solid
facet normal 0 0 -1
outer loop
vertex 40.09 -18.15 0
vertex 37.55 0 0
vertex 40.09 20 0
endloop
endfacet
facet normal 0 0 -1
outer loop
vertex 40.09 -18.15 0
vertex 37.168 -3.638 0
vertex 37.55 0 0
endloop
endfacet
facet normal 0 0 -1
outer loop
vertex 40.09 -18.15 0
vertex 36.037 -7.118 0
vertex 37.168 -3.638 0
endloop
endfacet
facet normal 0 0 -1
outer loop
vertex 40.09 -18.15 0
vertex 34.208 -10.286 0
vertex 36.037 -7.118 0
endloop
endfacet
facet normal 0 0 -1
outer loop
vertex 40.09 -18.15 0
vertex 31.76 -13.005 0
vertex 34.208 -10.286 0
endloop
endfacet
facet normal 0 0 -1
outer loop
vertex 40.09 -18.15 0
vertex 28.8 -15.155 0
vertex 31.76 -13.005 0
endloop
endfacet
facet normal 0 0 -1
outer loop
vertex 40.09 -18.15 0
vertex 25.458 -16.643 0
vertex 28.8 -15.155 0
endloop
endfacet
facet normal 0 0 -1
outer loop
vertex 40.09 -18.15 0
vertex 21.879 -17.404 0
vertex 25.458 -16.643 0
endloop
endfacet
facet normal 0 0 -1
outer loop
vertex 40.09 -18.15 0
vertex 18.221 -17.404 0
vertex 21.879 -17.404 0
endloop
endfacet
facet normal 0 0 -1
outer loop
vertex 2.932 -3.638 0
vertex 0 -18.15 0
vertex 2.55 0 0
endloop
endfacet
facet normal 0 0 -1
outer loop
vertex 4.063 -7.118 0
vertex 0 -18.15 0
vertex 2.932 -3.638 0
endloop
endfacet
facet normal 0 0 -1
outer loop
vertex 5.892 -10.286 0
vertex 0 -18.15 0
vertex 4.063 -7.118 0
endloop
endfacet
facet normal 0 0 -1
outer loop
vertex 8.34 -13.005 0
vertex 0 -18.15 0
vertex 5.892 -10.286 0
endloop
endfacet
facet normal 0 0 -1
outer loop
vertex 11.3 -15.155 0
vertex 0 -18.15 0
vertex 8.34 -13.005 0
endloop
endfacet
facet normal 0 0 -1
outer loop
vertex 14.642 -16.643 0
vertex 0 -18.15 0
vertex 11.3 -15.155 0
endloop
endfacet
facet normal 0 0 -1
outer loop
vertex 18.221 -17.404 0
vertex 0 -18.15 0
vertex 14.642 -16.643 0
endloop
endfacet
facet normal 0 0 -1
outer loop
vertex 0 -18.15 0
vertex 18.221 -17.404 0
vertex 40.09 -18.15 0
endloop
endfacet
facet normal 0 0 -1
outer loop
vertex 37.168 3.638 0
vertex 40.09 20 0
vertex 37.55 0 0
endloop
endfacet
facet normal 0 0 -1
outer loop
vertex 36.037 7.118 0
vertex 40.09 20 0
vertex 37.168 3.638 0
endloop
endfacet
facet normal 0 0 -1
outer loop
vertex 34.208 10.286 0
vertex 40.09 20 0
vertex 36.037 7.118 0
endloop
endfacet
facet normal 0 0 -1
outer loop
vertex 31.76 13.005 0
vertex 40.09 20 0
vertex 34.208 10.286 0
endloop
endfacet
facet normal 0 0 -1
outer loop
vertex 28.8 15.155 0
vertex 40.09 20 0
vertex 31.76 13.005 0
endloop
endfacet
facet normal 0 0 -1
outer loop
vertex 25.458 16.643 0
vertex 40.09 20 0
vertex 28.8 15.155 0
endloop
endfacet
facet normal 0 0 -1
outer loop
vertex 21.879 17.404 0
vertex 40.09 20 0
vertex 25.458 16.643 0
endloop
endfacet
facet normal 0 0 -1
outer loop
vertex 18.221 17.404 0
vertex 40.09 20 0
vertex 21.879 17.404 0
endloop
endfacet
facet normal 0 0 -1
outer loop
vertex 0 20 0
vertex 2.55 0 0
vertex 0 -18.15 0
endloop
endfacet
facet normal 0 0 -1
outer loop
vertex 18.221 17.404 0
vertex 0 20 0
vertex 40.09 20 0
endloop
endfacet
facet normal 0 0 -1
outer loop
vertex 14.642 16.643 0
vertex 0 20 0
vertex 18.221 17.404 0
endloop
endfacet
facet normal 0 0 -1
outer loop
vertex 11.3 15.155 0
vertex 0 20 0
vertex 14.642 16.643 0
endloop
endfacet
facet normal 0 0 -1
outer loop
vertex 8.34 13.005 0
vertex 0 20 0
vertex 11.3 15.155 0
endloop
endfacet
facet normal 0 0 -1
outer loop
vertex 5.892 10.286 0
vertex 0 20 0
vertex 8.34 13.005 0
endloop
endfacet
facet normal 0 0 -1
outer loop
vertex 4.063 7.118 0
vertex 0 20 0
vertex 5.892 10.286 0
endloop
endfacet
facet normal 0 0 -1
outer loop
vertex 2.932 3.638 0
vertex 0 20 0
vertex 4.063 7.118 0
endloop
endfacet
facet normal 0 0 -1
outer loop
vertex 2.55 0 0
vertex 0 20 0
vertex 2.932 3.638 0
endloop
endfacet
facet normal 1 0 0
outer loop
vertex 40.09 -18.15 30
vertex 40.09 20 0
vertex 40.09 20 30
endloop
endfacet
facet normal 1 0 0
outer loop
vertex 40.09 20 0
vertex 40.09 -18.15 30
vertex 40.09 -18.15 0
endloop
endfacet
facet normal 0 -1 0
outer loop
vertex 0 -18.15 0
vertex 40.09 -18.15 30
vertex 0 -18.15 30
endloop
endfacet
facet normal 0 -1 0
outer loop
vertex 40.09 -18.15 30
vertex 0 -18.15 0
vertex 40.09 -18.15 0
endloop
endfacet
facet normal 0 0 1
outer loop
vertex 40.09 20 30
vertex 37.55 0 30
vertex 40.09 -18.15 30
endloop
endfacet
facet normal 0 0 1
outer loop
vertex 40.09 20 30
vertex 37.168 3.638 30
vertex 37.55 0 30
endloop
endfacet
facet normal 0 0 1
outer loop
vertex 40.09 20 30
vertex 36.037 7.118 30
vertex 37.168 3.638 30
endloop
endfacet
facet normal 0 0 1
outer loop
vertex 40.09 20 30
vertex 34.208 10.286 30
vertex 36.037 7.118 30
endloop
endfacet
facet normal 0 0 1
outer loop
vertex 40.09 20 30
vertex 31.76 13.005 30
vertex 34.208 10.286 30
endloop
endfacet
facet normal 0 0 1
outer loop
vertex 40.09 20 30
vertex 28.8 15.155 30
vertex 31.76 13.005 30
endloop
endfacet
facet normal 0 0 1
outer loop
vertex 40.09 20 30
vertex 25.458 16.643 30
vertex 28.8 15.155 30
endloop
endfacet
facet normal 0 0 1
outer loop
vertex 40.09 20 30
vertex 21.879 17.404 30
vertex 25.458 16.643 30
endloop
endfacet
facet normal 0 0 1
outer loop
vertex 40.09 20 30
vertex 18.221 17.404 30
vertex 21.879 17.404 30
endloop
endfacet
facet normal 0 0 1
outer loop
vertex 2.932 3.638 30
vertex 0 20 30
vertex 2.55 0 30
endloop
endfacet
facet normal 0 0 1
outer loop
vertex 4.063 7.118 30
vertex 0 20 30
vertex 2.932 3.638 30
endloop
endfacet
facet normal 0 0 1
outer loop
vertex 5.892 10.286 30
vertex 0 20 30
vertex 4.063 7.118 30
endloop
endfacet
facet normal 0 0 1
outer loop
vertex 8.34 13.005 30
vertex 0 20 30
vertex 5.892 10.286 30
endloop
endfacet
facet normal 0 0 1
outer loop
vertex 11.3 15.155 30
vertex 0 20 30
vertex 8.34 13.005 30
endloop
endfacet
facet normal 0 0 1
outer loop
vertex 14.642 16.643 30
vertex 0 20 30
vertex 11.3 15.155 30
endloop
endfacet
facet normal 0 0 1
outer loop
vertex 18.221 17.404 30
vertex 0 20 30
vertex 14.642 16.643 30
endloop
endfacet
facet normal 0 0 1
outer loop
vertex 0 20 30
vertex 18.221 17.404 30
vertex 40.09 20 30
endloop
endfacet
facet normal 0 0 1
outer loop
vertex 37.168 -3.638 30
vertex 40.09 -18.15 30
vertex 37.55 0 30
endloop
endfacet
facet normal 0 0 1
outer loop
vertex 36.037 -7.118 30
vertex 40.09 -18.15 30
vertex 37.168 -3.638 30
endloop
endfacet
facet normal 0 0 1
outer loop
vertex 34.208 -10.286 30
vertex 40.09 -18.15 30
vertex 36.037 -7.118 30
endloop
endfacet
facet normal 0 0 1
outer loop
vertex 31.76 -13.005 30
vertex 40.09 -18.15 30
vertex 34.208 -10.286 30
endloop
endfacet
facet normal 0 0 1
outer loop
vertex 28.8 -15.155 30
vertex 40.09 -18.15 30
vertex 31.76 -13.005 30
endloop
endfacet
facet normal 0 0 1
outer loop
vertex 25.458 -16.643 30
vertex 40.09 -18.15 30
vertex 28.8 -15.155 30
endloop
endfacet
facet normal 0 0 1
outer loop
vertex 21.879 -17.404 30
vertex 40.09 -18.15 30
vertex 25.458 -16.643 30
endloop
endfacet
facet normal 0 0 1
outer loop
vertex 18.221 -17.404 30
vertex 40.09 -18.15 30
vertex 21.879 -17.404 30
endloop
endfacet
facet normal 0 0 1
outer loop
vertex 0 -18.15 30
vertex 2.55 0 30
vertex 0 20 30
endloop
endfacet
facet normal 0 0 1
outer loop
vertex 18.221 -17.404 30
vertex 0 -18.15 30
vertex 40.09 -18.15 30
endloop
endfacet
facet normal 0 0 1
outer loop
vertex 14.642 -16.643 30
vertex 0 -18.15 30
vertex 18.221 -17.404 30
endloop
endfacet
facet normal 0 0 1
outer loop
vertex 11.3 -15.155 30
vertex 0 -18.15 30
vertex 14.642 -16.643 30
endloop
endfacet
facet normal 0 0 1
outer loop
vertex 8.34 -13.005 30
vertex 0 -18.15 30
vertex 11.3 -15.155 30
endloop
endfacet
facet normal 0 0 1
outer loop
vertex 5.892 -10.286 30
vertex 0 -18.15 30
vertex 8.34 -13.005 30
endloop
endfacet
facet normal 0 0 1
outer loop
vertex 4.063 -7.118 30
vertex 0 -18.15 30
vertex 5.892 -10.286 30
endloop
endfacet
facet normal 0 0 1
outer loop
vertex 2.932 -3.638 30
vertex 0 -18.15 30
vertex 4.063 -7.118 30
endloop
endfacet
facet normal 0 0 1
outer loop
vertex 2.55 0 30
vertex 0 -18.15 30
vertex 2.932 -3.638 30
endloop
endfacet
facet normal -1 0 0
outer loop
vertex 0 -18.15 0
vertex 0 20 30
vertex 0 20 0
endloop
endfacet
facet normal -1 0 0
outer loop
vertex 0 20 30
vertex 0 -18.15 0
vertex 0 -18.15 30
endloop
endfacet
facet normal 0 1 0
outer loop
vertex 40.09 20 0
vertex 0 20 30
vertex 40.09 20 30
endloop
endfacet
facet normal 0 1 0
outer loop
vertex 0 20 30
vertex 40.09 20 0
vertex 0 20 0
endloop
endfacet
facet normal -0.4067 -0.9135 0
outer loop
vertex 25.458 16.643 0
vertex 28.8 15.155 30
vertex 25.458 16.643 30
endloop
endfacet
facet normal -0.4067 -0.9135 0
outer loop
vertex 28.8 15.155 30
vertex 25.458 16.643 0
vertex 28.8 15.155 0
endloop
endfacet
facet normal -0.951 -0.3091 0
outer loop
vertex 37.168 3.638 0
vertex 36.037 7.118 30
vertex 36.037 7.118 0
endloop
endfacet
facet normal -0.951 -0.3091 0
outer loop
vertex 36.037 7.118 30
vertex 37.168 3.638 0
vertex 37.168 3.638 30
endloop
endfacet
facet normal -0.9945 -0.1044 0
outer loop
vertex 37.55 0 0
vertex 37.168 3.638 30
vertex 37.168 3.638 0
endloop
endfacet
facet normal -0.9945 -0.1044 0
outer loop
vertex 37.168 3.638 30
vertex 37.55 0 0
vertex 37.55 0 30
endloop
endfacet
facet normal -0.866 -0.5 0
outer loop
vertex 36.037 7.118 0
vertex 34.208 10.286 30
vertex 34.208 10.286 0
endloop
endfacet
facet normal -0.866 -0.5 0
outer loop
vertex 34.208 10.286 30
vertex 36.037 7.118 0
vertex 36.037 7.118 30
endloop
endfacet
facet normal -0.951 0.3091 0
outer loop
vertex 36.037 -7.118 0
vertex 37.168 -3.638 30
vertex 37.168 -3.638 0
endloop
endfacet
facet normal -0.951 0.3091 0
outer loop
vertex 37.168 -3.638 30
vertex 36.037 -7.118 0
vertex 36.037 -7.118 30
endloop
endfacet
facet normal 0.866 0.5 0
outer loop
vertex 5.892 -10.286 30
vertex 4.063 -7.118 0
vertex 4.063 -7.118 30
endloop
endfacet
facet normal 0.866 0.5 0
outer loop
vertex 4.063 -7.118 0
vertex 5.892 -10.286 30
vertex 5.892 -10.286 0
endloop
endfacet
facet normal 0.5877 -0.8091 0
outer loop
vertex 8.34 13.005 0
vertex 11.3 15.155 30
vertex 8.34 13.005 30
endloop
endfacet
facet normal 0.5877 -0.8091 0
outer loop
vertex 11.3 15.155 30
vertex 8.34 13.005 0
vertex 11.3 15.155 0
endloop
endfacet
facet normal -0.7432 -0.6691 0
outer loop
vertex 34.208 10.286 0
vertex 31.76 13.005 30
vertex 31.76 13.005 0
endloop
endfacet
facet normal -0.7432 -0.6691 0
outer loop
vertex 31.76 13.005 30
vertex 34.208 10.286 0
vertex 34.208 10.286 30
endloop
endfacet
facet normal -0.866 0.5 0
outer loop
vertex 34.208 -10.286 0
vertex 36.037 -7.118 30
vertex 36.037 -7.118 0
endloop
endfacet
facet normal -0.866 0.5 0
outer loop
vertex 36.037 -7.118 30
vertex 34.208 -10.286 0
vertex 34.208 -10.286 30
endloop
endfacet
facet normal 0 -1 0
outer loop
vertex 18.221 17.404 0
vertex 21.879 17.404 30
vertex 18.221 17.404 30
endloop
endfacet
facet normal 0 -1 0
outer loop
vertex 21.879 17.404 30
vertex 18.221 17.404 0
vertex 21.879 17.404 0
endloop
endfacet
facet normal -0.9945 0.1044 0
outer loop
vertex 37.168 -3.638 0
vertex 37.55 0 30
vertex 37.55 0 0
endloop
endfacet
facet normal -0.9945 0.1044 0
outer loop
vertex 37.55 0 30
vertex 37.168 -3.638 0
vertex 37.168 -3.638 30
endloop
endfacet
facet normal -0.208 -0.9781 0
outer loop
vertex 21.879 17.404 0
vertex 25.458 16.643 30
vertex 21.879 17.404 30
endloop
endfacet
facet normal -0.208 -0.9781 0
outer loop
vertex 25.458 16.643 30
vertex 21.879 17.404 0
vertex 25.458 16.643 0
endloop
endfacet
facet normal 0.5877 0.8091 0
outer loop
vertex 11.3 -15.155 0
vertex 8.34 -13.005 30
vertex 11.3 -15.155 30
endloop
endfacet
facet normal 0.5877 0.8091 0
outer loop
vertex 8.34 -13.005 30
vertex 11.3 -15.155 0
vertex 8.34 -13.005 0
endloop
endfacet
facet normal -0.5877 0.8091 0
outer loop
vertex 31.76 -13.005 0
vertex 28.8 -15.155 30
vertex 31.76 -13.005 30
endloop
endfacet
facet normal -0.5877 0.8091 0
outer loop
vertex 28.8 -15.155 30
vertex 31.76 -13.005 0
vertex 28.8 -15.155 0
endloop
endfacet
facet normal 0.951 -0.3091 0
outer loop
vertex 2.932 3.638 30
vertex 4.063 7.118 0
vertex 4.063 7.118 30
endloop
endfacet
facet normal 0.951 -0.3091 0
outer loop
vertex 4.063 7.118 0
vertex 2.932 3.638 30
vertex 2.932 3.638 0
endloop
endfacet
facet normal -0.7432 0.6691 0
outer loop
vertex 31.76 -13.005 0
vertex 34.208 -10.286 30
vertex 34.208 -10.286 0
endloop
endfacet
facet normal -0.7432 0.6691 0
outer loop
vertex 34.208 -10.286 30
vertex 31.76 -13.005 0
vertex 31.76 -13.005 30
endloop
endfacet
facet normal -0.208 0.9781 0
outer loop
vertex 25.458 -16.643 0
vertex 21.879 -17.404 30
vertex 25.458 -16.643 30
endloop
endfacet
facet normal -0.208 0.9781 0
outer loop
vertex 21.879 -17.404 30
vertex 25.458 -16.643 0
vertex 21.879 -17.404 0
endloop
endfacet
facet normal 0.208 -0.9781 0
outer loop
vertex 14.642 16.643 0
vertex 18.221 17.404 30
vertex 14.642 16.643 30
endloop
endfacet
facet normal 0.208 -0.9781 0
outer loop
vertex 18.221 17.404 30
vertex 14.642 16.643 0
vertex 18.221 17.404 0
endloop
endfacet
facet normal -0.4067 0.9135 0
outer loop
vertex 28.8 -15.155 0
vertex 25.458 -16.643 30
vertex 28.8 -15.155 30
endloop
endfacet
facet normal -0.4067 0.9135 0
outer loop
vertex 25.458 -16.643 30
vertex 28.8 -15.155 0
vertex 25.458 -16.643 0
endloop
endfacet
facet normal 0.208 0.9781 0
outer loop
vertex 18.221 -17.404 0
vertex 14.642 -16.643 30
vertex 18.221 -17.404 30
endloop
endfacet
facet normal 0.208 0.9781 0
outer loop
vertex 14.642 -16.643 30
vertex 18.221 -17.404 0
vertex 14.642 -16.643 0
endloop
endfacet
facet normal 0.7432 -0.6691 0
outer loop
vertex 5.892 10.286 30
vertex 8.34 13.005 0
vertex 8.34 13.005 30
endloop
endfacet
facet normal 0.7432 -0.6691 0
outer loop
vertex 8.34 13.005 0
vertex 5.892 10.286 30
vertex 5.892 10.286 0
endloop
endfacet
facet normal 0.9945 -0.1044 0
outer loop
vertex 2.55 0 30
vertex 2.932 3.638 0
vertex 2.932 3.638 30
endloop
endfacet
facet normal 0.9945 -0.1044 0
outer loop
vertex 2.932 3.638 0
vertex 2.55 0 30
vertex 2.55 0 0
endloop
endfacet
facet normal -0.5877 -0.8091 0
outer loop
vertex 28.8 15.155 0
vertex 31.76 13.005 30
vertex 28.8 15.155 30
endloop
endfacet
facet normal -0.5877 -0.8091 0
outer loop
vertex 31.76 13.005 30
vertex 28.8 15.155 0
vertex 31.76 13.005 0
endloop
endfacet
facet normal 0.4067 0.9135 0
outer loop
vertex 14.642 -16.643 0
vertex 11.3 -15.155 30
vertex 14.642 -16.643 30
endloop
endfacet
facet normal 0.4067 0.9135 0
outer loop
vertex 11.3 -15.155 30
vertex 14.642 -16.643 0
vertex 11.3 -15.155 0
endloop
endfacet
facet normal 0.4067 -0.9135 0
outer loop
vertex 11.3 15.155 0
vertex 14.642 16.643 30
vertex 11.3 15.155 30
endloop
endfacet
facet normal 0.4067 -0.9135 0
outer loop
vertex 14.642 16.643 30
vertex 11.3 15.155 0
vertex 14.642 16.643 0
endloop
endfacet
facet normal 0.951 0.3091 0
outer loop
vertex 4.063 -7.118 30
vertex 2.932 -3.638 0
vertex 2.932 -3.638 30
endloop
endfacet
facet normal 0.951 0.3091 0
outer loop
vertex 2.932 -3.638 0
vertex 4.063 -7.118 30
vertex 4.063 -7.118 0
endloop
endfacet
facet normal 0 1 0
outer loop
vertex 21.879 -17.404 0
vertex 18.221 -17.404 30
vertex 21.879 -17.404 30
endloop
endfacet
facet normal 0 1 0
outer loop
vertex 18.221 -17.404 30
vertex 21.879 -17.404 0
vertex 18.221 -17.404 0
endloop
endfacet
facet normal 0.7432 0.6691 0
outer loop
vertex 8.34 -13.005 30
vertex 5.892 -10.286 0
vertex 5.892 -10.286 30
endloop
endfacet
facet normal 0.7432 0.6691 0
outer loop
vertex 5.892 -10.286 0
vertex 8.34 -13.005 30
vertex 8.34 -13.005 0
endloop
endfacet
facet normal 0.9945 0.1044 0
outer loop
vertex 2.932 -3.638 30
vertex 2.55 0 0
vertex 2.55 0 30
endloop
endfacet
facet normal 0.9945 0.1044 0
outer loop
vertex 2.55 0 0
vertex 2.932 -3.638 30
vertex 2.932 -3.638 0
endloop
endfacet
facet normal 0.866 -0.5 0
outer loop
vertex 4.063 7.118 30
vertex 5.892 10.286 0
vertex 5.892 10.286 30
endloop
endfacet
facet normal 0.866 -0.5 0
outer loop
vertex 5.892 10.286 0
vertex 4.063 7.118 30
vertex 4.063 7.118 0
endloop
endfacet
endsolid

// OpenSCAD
// Asymmetric-bbox regression fixture (issue #223, golden-b).
//
// Reconstructed from the real v16 model (project 32): the harvested STL's
// bounding box is x[0, 40.09], y[-18.15, 20], z[0, 30] — the silhouette is
// NOT symmetric about the origin, the x range is entirely positive, and the
// y range is skewed negative. The front view (camera -Z) clips the right
// frame edge and the top view (camera +Z) clips the right and top edges
// unless the per-model fit is correct.
//
// Polyhedron box with a central bore; the bore leaves the outer hull
// exactly the 40.09 × 38.15 × 30 box above (the bore only removes
// interior material, the hull is unchanged).
difference() {
  polyhedron(
    points = [
      [0, -18.15, 0], [40.09, -18.15, 0], [40.09, 20, 0], [0, 20, 0],
      [0, -18.15, 30], [40.09, -18.15, 30], [40.09, 20, 30], [0, 20, 30]
    ],
    faces = [
      [0, 1, 2, 3], [4, 7, 6, 5], [0, 4, 5, 1], [1, 5, 6, 2], [2, 6, 7, 3], [3, 7, 4, 0]
    ]
  );
  translate([20.05, 0, 0])
    cylinder(h=31, d=35);
}
